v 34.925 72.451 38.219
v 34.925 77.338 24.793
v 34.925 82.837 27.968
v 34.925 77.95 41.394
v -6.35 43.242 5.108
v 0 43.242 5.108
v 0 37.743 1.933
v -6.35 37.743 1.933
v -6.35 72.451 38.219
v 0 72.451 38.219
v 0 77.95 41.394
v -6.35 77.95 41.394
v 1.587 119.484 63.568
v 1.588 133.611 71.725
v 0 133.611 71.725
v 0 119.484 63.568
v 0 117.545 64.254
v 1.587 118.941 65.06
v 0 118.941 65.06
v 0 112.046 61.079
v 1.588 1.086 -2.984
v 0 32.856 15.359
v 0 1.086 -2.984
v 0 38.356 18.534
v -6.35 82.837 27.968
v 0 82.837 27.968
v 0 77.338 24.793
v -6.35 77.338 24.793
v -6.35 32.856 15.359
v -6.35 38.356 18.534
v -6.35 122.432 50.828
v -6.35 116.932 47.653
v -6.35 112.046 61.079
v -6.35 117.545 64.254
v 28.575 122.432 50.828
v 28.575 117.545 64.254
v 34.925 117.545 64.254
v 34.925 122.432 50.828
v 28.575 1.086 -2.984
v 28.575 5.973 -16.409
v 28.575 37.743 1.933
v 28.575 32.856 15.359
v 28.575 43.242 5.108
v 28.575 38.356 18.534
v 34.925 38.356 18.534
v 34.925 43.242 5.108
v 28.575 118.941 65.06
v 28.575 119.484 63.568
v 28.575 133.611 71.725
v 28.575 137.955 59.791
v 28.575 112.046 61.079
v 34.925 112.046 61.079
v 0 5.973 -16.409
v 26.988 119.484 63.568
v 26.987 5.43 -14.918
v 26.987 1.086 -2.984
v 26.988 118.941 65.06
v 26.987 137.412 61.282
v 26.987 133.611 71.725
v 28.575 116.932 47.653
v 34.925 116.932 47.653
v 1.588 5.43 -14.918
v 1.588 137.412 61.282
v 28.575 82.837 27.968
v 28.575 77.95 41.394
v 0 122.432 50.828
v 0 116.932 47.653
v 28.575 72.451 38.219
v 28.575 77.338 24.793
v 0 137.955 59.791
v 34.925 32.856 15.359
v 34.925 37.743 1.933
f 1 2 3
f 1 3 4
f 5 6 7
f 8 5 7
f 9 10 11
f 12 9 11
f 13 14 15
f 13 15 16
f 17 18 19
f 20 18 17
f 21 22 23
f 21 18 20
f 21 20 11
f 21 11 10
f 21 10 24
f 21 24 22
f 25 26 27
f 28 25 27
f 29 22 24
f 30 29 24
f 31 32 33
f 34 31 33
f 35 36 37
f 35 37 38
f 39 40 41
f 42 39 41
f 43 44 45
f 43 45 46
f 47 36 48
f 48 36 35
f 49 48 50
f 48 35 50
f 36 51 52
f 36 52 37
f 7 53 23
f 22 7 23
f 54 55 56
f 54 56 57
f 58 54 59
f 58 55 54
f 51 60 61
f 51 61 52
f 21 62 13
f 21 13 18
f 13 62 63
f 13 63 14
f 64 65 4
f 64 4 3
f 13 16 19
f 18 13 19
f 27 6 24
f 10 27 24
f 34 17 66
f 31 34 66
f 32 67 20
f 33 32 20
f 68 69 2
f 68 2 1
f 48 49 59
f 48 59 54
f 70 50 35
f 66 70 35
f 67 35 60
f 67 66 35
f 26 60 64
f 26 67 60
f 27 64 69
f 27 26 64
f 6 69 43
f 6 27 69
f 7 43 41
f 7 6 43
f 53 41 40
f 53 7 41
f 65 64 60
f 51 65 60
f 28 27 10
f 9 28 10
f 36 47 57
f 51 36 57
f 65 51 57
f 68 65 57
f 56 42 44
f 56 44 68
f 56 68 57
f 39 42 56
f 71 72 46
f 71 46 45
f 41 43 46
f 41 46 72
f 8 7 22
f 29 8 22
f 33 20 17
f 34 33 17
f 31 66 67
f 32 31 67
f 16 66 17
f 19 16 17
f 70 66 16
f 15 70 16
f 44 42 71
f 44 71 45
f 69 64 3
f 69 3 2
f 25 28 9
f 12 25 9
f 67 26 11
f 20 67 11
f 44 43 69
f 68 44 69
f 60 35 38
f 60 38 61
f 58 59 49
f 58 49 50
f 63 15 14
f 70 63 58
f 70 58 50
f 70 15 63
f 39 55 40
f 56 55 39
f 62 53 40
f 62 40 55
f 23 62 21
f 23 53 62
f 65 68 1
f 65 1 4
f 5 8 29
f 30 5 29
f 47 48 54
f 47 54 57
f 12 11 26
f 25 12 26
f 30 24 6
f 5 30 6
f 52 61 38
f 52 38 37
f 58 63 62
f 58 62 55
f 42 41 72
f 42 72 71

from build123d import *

# Parameters (mm, degrees)
BOSS_EXTRUDE1_DEPTH   = 28.575
SKETCH2_W             = 25.4
SKETCH2_H             = 14.2875
CUT_EXTRUDE2_DEPTH    = 159.114345309
CUT_EXTRUDE3_DEPTH    = 29.575
CUT_EXTRUDE4_DEPTH    = 25.4
SKETCH6_W             = 1.5875
SKETCH6_H             = 82.55
BOSS_EXTRUDE2_DEPTH   = 1.5875
CUT_EXTRUDE5_DEPTH    = 29.575
CUT_EXTRUDE6_DEPTH    = 29.575
BOSS_EXTRUDE3_DEPTH   = 6.35
BOSS_EXTRUDE3_2_DEPTH = 6.35
BOSS_EXTRUDE3_3_DEPTH = 6.35


with BuildPart() as part:
    # Sketch1 → Boss-Extrude1 (new body)
    with BuildSketch(Plane(origin=(0, 0, 0), x_dir=(0, 0, -1), z_dir=(1, 0, 0))):
        Polygon((0, 0), (-76.2, 131.982271537), (-59.79061761, 137.95479829), (16.40938239, 5.972526753), align=None)
    extrude(amount=BOSS_EXTRUDE1_DEPTH)

    # Sketch2 → Cut-Extrude2 (cut, through all, along a direction that is not the sketch's normal)
    with BuildSketch(Plane(origin=(0, 141.033486548, 51.331991138), x_dir=(1, 0, 0), z_dir=(0, 0.939692621, 0.342020143))):
        with Locations((14.2875, -17.732732276)):
            Rectangle(SKETCH2_W, SKETCH2_H)
    extrude(amount=-CUT_EXTRUDE2_DEPTH, dir=(0, 0.866025404, 0.5), mode=Mode.SUBTRACT)

    # Sketch3 → Cut-Extrude3 (cut, through all)
    with BuildSketch(Plane(origin=(28.575, 0, 0), x_dir=(0, 0, -1), z_dir=(1, 0, 0))):
        Polygon((-76.2, 131.982271537), (-74.708237965, 132.525228514), (-33.433237965, 61.034831432), (-34.925, 60.491874454), align=None)
    extrude(amount=-CUT_EXTRUDE3_DEPTH, mode=Mode.SUBTRACT)

    # Sketch4 → Cut-Extrude4 (cut)
    with BuildSketch(Plane(origin=(1.5875, 0, 0), x_dir=(0, 0, -1), z_dir=(1, 0, 0))):
        Polygon((-43.162002392, 69.198234075), (-23.704473537, 52.871428789), (-24.724898867, 51.655333235), (-44.182427722, 67.982138521), align=None)
    extrude(amount=CUT_EXTRUDE4_DEPTH, mode=Mode.SUBTRACT)

    # Sketch6 → Boss-Extrude2 (add, along a direction that is not the sketch's normal)
    with BuildSketch(Plane(origin=(0, 0.781691154, -1.353928794), x_dir=(1, 0, 0), z_dir=(0, -0.5, 0.866025404))):
        with Locations((27.78125, 110.849333518)):
            Rectangle(SKETCH6_W, SKETCH6_H)
        with Locations((0.79375, 110.849333518)):
            Rectangle(SKETCH6_W, SKETCH6_H)
    extrude(amount=BOSS_EXTRUDE2_DEPTH, dir=(0, -0.342020143, 0.939692621))

    # Sketch7 → Cut-Extrude5 (cut, through all)
    with BuildSketch(Plane(origin=(28.575, 0, 0), x_dir=(0, 0, -1), z_dir=(1, 0, 0))):
        Polygon((-76.2, 131.982271537), (-71.724713894, 133.611142469), (-63.568463887, 119.484103058), (-68.043749993, 117.855232125), align=None)
    extrude(amount=-CUT_EXTRUDE5_DEPTH, mode=Mode.SUBTRACT)

    # Sketch8 → Cut-Extrude6 (cut, through all)
    with BuildSketch(Plane(origin=(28.575, 0, 0), x_dir=(0, 0, -1), z_dir=(1, 0, 0))):
        Polygon((-68.043749993, 117.855232125), (-65.060225922, 118.94114608), (2.983524071, 1.085913955), (0, 0), align=None)
    extrude(amount=-CUT_EXTRUDE6_DEPTH, mode=Mode.SUBTRACT)


with BuildPart() as body_2:
    # Sketch9 → Boss-Extrude3 (new body)
    with BuildSketch(Plane(origin=(28.575, 0, 0), x_dir=(0, 0, -1), z_dir=(1, 0, 0))):
        Polygon((-64.254231049, 117.545122009), (-50.828372729, 122.431734807), (-47.653372729, 116.932473493), (-61.079231049, 112.045860695), align=None)
    extrude(amount=BOSS_EXTRUDE3_DEPTH)


with BuildPart() as body_3:
    # Sketch9 → Boss-Extrude3 2 (new body)
    with BuildSketch(Plane(origin=(28.575, 0, 0), x_dir=(0, 0, -1), z_dir=(1, 0, 0))):
        Polygon((-41.394231049, 77.950440548), (-27.968372729, 82.837053346), (-24.793372729, 77.337792032), (-38.219231049, 72.451179234), align=None)
    extrude(amount=BOSS_EXTRUDE3_2_DEPTH)


with BuildPart() as body_4:
    # Sketch9 → Boss-Extrude3 3 (new body)
    with BuildSketch(Plane(origin=(28.575, 0, 0), x_dir=(0, 0, -1), z_dir=(1, 0, 0))):
        Polygon((-18.534231049, 38.355759087), (-5.108372729, 43.242371885), (-1.933372729, 37.743110571), (-15.359231049, 32.856497773), align=None)
    extrude(amount=BOSS_EXTRUDE3_3_DEPTH)


with BuildPart() as body_5:
    # Mirror1: mirrored copy
    add(body_2.part.mirror(Plane.ZY.offset(-14.2875)))


with BuildPart() as body_6:
    # Mirror1 2: mirrored copy
    add(body_3.part.mirror(Plane.ZY.offset(-14.2875)))


with BuildPart() as body_7:
    # Mirror1 3: mirrored copy
    add(body_4.part.mirror(Plane.ZY.offset(-14.2875)))


with BuildPart() as part_1:
    add(part.part)

    # Combine1: union body 2, body 3, body 4, body 7, body 6, body 5
    add(body_2.part)
    add(body_3.part)
    add(body_4.part)
    add(body_7.part)
    add(body_6.part)
    add(body_5.part)


solid = part_1.part
